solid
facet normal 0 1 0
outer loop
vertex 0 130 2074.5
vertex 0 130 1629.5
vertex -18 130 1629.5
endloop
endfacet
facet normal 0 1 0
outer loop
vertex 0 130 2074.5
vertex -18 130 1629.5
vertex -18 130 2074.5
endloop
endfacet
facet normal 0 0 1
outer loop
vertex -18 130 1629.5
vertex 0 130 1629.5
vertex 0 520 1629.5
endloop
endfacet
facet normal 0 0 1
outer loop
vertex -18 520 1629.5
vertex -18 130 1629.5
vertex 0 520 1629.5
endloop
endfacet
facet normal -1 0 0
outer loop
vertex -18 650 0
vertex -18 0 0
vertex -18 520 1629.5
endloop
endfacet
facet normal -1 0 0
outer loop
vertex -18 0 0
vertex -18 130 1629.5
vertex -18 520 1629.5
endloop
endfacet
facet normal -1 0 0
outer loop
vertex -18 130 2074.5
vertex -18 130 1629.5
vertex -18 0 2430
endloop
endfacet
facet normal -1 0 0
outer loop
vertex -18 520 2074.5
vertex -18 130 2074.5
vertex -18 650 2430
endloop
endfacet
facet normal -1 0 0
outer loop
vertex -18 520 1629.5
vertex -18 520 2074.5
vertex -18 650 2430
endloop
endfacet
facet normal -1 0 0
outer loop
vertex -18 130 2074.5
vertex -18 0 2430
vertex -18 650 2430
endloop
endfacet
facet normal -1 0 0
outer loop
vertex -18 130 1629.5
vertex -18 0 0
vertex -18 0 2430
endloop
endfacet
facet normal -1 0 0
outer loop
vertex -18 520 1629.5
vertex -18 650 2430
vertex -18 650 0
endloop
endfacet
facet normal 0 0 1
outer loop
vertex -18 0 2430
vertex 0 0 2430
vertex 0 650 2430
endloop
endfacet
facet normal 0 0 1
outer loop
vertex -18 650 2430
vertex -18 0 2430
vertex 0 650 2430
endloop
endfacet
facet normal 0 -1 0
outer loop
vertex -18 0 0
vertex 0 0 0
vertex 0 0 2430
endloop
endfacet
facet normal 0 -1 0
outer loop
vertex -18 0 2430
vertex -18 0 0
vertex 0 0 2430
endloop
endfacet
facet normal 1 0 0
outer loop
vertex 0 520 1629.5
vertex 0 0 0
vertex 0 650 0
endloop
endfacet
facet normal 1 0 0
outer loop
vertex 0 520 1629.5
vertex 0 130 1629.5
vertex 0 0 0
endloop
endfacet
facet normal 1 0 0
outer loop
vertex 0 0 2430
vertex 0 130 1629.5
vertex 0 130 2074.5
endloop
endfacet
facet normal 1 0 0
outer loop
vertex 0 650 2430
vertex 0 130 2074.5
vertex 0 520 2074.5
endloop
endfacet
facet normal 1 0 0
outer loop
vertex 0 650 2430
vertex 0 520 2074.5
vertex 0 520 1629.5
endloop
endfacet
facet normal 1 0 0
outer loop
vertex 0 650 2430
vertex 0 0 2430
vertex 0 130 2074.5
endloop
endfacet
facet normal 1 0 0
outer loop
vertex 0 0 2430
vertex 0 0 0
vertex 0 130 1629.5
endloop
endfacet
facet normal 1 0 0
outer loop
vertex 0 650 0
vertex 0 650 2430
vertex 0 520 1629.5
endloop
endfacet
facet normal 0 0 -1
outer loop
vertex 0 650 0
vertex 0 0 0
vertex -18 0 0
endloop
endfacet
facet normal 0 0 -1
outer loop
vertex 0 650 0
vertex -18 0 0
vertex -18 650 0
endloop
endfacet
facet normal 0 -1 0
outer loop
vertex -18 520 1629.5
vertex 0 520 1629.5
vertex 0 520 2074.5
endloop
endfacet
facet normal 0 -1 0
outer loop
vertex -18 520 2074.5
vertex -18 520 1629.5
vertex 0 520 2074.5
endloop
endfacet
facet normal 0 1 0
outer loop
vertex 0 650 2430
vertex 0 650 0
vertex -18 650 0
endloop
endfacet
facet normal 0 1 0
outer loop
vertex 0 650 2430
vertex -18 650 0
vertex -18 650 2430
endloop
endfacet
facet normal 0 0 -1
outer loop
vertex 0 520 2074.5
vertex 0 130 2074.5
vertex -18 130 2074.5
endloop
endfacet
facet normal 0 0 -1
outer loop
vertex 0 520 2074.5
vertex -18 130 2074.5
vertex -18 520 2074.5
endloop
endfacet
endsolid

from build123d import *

# Parameters (mm, degrees)
F0_W     = 650
F0_H     = 2430
F1_DEPTH = 18
F2_W     = 390
F2_H     = 445
F3_DEPTH = 18.001


with BuildPart() as f1:
    # F0 (on Right) → F1 (new body)
    with BuildSketch(Plane.YZ):
        with Locations((325, 1215)):
            Rectangle(F0_W, F0_H)
    extrude(amount=-F1_DEPTH)

    # F2 (on face) → F3 (cut, through all)
    with BuildSketch(Plane.YZ):
        with Locations((325, 1852)):
            Rectangle(F2_W, F2_H)
    extrude(amount=-F3_DEPTH, mode=Mode.SUBTRACT)


solid = f1.part
